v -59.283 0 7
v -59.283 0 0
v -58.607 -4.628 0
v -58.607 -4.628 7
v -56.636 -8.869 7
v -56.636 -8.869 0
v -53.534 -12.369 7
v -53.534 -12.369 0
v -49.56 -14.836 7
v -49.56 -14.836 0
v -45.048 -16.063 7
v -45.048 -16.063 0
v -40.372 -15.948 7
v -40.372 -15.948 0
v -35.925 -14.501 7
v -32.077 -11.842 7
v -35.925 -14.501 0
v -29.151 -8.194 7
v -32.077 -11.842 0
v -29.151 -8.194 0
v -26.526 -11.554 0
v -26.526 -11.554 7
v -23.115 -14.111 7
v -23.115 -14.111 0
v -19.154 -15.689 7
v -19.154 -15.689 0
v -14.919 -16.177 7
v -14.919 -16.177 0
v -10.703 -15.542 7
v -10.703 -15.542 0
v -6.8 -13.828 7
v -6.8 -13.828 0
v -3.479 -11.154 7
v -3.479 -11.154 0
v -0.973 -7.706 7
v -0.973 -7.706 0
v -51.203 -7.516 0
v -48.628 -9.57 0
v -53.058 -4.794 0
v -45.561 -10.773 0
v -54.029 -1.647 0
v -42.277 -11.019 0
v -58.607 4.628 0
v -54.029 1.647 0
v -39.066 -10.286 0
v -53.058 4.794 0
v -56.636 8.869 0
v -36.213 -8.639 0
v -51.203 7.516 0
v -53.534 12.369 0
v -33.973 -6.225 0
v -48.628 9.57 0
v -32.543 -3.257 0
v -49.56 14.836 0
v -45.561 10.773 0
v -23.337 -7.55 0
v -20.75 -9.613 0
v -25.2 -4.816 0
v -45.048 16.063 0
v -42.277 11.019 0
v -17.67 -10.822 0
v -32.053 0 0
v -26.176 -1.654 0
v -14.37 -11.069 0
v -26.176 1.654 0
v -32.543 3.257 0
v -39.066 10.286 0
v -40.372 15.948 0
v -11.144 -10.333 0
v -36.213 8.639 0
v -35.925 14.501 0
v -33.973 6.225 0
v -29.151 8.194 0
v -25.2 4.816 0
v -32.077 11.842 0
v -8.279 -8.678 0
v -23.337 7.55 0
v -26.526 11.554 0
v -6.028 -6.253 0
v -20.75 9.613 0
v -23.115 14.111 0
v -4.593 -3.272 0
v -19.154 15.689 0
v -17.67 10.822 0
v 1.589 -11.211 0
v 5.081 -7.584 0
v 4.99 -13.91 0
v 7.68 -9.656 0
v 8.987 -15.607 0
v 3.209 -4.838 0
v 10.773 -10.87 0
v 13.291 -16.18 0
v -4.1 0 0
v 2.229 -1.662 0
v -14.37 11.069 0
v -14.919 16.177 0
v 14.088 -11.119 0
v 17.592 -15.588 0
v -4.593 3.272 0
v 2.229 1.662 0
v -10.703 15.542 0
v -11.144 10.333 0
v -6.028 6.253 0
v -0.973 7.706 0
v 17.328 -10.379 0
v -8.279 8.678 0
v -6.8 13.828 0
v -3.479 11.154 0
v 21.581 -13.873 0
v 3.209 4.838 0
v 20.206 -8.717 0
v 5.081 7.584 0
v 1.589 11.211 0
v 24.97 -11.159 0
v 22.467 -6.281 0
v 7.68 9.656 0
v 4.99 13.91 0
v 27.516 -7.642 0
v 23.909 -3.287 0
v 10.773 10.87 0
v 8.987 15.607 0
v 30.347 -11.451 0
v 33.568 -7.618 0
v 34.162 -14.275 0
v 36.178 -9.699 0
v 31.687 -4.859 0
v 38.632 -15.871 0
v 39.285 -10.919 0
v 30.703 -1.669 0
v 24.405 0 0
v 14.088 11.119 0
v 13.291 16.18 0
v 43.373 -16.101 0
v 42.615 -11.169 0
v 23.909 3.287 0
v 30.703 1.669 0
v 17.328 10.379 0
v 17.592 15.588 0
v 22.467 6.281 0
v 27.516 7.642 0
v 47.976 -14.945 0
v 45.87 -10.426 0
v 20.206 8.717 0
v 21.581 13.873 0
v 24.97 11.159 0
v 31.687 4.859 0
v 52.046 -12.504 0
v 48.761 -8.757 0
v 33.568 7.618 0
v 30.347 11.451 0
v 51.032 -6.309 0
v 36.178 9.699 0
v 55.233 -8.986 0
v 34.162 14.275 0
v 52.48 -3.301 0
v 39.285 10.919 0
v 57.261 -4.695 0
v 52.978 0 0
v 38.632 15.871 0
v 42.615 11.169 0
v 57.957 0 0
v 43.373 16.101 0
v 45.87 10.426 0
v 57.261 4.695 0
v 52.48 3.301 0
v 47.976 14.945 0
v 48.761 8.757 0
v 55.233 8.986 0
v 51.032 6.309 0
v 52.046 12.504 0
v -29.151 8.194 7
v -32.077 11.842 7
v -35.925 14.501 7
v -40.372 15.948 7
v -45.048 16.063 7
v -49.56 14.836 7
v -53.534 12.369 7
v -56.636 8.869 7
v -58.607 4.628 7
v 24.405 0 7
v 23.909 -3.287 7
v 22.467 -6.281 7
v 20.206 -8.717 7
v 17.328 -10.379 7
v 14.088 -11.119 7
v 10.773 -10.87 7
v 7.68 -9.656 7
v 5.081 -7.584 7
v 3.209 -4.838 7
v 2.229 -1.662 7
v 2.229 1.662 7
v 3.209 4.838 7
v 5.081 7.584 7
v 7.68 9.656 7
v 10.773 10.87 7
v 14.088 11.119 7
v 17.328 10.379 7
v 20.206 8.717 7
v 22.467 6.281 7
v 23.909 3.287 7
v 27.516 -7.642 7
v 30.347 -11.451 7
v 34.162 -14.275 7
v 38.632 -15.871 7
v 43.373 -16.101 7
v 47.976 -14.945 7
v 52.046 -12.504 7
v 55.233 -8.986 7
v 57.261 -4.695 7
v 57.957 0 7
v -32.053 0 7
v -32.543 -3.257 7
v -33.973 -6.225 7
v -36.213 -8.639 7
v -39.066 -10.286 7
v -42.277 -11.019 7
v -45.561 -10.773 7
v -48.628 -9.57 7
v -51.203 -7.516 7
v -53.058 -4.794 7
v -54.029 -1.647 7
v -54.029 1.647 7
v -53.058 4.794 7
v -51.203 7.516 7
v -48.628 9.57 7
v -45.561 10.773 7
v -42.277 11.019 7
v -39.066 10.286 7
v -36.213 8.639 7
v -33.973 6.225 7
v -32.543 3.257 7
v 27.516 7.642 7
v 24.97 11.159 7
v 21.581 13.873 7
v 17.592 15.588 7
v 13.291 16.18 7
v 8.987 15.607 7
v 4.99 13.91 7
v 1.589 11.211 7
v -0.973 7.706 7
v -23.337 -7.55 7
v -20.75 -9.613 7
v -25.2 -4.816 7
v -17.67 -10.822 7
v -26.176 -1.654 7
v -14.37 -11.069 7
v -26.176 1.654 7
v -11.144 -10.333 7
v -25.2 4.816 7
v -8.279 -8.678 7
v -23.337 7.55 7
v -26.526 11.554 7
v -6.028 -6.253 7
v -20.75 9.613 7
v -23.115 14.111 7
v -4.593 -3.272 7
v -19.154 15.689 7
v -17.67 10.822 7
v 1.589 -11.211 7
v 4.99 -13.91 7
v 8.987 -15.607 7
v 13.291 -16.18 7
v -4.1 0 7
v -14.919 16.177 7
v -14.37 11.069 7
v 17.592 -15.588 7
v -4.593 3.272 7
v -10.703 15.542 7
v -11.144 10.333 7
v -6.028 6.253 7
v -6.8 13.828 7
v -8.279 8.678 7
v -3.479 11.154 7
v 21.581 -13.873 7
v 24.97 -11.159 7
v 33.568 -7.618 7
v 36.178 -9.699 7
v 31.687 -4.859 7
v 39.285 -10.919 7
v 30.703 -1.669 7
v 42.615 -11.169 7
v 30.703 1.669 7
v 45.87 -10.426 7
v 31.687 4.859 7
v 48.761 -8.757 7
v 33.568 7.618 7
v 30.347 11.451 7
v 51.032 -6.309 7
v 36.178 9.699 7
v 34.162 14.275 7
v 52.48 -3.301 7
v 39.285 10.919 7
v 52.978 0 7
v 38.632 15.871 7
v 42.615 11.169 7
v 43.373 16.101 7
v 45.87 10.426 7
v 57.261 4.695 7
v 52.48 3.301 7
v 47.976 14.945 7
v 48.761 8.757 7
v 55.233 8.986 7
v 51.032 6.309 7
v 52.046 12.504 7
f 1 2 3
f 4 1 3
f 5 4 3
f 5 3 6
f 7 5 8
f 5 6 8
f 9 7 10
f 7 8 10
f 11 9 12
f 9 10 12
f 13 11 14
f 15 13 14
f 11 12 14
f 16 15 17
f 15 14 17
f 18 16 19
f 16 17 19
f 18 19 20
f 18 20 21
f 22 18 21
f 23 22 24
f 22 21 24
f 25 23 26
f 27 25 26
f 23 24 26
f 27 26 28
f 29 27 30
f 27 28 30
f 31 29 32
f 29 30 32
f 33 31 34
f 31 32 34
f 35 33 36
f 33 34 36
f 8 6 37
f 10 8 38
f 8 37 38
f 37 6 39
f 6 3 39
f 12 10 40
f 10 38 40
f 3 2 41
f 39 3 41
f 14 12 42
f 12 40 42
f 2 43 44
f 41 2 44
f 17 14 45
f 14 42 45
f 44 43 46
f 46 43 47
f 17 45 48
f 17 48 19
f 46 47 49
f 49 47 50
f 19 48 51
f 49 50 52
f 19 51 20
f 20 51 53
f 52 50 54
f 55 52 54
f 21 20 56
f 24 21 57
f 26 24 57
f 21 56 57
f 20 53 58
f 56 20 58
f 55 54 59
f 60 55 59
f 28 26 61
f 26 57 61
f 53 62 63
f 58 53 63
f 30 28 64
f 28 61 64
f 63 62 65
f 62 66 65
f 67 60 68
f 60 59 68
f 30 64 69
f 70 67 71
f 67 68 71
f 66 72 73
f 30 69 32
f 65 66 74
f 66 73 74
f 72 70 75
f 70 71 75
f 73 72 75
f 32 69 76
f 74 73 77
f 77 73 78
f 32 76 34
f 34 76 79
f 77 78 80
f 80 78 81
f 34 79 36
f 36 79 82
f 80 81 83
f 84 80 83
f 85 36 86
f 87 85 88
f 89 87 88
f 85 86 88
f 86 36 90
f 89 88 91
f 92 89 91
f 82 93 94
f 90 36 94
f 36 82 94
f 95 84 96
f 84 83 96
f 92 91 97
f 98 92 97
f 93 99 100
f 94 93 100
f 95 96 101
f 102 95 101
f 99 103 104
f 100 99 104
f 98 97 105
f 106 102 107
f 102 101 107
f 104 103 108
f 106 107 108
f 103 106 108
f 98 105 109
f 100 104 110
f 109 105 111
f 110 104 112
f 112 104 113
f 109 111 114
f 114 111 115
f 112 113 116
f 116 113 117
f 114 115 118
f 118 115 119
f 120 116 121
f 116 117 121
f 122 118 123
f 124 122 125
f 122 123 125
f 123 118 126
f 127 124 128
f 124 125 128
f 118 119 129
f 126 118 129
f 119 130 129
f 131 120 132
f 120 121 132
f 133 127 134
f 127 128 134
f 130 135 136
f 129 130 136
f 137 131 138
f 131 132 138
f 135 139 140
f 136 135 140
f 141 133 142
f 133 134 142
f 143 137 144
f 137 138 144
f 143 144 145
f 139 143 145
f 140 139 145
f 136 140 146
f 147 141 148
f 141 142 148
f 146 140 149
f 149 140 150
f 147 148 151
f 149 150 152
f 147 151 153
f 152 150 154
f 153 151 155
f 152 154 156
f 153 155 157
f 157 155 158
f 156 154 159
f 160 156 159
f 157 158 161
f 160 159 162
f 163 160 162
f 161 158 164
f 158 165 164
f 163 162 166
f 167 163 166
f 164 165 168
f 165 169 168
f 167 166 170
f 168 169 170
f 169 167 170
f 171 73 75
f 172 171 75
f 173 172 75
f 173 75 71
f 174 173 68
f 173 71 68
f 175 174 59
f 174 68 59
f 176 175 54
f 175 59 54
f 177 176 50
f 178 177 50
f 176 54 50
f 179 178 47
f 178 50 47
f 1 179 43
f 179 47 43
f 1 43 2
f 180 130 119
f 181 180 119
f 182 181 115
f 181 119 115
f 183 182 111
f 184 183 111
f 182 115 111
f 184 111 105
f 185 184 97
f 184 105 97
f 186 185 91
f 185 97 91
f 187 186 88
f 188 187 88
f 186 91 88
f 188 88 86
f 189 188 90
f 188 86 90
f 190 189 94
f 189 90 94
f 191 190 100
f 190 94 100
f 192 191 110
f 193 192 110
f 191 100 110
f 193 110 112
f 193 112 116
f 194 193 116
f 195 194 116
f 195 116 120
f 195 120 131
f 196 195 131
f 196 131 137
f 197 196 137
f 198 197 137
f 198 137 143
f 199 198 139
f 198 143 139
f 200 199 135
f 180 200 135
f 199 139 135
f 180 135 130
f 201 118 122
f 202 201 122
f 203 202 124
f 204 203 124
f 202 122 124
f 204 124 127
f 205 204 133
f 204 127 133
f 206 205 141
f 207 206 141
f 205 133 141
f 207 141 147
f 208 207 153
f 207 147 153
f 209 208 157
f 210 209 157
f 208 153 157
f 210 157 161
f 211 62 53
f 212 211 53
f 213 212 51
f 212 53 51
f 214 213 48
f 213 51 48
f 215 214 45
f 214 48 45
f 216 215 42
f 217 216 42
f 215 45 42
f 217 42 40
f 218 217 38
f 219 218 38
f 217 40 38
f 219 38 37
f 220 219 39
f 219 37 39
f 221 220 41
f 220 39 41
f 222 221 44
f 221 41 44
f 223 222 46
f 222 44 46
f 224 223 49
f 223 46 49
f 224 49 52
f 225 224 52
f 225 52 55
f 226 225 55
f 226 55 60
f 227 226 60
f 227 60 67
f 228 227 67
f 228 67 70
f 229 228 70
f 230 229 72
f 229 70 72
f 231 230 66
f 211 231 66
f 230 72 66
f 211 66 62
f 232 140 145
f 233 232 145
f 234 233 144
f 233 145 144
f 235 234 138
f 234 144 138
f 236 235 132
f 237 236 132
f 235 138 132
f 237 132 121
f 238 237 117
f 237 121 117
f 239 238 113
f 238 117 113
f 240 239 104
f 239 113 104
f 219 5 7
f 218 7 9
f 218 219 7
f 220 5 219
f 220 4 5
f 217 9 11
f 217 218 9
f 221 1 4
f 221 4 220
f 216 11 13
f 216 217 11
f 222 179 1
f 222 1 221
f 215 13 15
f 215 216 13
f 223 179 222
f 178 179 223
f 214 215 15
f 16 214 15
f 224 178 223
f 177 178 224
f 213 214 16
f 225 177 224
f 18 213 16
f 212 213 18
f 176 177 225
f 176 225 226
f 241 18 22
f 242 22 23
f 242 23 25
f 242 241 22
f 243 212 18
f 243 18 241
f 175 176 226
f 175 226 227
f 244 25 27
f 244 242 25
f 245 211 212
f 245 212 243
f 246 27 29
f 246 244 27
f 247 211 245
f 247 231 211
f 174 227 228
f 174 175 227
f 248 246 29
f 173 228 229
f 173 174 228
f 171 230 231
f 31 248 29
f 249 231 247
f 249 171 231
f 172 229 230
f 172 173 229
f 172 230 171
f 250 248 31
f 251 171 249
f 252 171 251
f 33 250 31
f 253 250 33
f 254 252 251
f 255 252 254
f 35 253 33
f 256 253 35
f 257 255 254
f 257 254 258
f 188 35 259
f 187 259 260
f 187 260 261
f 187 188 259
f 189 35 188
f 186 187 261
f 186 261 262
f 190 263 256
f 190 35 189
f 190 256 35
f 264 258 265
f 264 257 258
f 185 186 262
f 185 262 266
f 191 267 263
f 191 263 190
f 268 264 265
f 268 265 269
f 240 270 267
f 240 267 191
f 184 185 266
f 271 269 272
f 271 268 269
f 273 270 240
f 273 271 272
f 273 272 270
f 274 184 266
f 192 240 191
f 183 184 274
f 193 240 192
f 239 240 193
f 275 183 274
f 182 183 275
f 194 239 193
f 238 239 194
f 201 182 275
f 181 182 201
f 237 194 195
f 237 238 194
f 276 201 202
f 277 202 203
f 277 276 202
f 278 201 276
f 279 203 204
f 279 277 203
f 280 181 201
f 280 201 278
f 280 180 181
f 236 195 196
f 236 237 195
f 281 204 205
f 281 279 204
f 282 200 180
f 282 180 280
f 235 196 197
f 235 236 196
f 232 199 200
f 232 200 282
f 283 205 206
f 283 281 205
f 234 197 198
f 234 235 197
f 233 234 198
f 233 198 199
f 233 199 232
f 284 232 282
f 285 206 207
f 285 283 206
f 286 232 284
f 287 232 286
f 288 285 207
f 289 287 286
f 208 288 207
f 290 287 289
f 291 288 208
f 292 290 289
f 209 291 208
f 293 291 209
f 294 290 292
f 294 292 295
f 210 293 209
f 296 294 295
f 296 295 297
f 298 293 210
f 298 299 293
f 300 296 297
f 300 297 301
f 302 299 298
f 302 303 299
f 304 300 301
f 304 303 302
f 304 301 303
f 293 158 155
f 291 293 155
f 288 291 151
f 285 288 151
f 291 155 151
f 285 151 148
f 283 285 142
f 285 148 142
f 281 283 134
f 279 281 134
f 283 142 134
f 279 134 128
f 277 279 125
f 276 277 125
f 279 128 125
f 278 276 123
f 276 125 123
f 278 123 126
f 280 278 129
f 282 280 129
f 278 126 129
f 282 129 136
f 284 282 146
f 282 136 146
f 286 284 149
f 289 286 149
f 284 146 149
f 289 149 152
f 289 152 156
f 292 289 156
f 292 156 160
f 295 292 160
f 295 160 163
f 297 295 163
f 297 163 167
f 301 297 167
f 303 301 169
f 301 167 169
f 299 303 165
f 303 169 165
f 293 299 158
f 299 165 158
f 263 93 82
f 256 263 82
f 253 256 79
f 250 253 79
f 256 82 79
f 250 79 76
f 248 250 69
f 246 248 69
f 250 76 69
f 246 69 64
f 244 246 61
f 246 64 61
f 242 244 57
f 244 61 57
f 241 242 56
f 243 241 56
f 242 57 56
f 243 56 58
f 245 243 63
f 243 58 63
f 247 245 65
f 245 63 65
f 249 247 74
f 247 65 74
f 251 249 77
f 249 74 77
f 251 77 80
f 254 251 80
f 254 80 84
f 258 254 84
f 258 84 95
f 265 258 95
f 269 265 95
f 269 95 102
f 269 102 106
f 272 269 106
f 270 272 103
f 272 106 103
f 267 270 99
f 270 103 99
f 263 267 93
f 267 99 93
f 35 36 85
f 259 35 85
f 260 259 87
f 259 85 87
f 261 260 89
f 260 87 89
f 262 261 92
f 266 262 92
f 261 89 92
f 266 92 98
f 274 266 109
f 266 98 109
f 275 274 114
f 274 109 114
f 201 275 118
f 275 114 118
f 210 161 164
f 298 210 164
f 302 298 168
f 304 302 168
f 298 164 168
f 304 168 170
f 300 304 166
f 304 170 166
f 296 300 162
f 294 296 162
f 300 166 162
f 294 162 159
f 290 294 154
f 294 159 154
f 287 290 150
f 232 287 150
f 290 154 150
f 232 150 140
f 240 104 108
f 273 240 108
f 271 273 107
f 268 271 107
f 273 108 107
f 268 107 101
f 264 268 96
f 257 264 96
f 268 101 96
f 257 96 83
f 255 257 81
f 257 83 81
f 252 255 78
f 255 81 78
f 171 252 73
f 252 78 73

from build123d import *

# Parameters (mm, degrees)
F1_DEPTH = 7


with BuildPart() as f1:
    # F0 (on Top) → F1 (new body)
    with BuildSketch(Plane.XY):
        with BuildLine():
            Line((-31.3795059258, 0), (-26.922398242, 0))
            ThreePointArc((-26.922398242, 0), (-27.4894668745, 4.2460498939), (-29.1509244493, 8.1944755629))
            ThreePointArc((-29.1509244493, 8.1944755629), (-30.8124227539, 4.246057146), (-31.3795059258, 0))
        make_face()
        with BuildLine():
            Line((-26.2997059258, 0), (-26.922398242, 0))
            ThreePointArc((-26.922398242, 0), (-27.4894668745, -4.2460498939), (-29.1509244493, -8.1944755629))
            ThreePointArc((-29.1509244493, -8.1944755629), (-14.9190087878, -16.1773649633), (-0.9726024938, -7.7055470911))
            ThreePointArc((-0.9726024938, -7.7055470911), (-2.4295294135, -3.9745590906), (-2.9252990617, 0))
            Line((-2.9252990617, 0), (-4.0997059258, 0))
            ThreePointArc((-4.0997059258, 0), (-15.1997059258, -11.1), (-26.2997059258, 0))
        make_face()
        with BuildLine():
            ThreePointArc((-29.1509244493, 8.1944755629), (-27.4894668745, 4.2460498939), (-26.922398242, 0))
            Line((-26.922398242, 0), (-26.2997059258, 0))
            ThreePointArc((-26.2997059258, 0), (-15.1997059258, 11.1), (-4.0997059258, 0))
            Line((-4.0997059258, 0), (-2.9252990617, 0))
            ThreePointArc((-2.9252990617, 0), (-2.4295294135, 3.9745590906), (-0.9726024938, 7.7055470911))
            ThreePointArc((-0.9726024938, 7.7055470911), (-14.9190087878, 16.1773649633), (-29.1509244493, 8.1944755629))
        make_face()
        with BuildLine():
            ThreePointArc((-29.1509244493, -8.1944755629), (-27.4894668745, -4.2460498939), (-26.922398242, 0))
            Line((-26.922398242, 0), (-31.3795059258, 0))
            ThreePointArc((-31.3795059258, 0), (-30.8124227539, -4.246057146), (-29.1509244493, -8.1944755629))
        make_face()
        with BuildLine():
            ThreePointArc((-31.3795059258, 0), (-30.8124227539, 4.246057146), (-29.1509244493, 8.1944755629))
            ThreePointArc((-29.1509244493, 8.1944755629), (-47.3485941376, 15.6130773691), (-59.2826902453, 0))
            Line((-59.2826902453, 0), (-54.1525442436, 0))
            ThreePointArc((-54.1525442436, 0), (-43.1025442436, 11.05), (-32.0525442436, 0))
            Line((-32.0525442436, 0), (-31.3795059258, 0))
        make_face()
        with BuildLine():
            ThreePointArc((-59.2826902453, 0), (-47.3485941376, -15.6130773691), (-29.1509244493, -8.1944755629))
            ThreePointArc((-29.1509244493, -8.1944755629), (-30.8124227539, -4.246057146), (-31.3795059258, 0))
            Line((-31.3795059258, 0), (-32.0525442436, 0))
            ThreePointArc((-32.0525442436, 0), (-43.1025442436, -11.05), (-54.1525442436, 0))
            Line((-54.1525442436, 0), (-59.2826902453, 0))
        make_face()
        with BuildLine():
            ThreePointArc((27.5160949741, 7.6415223351), (13.2908629072, 16.1797591406), (-0.9726024938, 7.7055470911))
            ThreePointArc((-0.9726024938, 7.7055470911), (0.4843244259, 3.9745590906), (0.9800940742, 0))
            Line((0.9800940742, 0), (2.1045009383, 0))
            ThreePointArc((2.1045009383, 0), (13.2545009383, 11.15), (24.4045009383, 0))
            Line((24.4045009383, 0), (25.5978890099, 0))
            ThreePointArc((25.5978890099, 0), (26.0847659676, 3.9393012616), (27.5160949741, 7.6415223351))
        make_face()
        with BuildLine():
            ThreePointArc((0.9800940742, 0), (0.4843244259, 3.9745590906), (-0.9726024938, 7.7055470911))
            ThreePointArc((-0.9726024938, 7.7055470911), (-2.4295294135, 3.9745590906), (-2.9252990617, 0))
            Line((-2.9252990617, 0), (0, 0))
            Line((0, 0), (0.9800940742, 0))
        make_face()
        with BuildLine():
            ThreePointArc((-2.9252990617, 0), (-2.4295294135, -3.9745590906), (-0.9726024938, -7.7055470911))
            ThreePointArc((-0.9726024938, -7.7055470911), (0.4843244259, -3.9745590906), (0.9800940742, 0))
            Line((0.9800940742, 0), (0, 0))
            Line((0, 0), (-2.9252990617, 0))
        make_face()
        with BuildLine():
            ThreePointArc((0.9800940742, 0), (0.4843244259, -3.9745590906), (-0.9726024938, -7.7055470911))
            ThreePointArc((-0.9726024938, -7.7055470911), (13.2908629072, -16.1797591406), (27.5160949741, -7.6415223351))
            ThreePointArc((27.5160949741, -7.6415223351), (26.0847659676, -3.9393012616), (25.5978890099, 0))
            Line((25.5978890099, 0), (24.4045009383, 0))
            ThreePointArc((24.4045009383, 0), (13.2545009383, -11.15), (2.1045009383, 0))
            Line((2.1045009383, 0), (0.9800940742, 0))
        make_face()
        with BuildLine():
            ThreePointArc((57.9574890099, 0), (45.7169902715, 15.6929230423), (27.5160949741, 7.6415223351))
            ThreePointArc((27.5160949741, 7.6415223351), (28.9474239806, 3.9393012616), (29.4343009383, 0))
            Line((29.4343009383, 0), (30.5776890099, 0))
            ThreePointArc((30.5776890099, 0), (41.7776890099, 11.2), (52.9776890099, 0))
            Line((52.9776890099, 0), (57.9574890099, 0))
        make_face()
        with BuildLine():
            ThreePointArc((29.4343009383, 0), (28.9474239806, 3.9393012616), (27.5160949741, 7.6415223351))
            ThreePointArc((27.5160949741, 7.6415223351), (26.0847659676, 3.9393012616), (25.5978890099, 0))
            Line((25.5978890099, 0), (29.4343009383, 0))
        make_face()
        with BuildLine():
            ThreePointArc((25.5978890099, 0), (26.0847659676, -3.9393012616), (27.5160949741, -7.6415223351))
            ThreePointArc((27.5160949741, -7.6415223351), (28.9474239806, -3.9393012616), (29.4343009383, 0))
            Line((29.4343009383, 0), (25.5978890099, 0))
        make_face()
        with BuildLine():
            ThreePointArc((29.4343009383, 0), (28.9474239806, -3.9393012616), (27.5160949741, -7.6415223351))
            ThreePointArc((27.5160949741, -7.6415223351), (45.7169902715, -15.6929230423), (57.9574890099, 0))
            Line((57.9574890099, 0), (52.9776890099, 0))
            ThreePointArc((52.9776890099, 0), (41.7776890099, -11.2), (30.5776890099, 0))
            Line((30.5776890099, 0), (29.4343009383, 0))
        make_face()
    extrude(amount=F1_DEPTH)


solid = f1.part
